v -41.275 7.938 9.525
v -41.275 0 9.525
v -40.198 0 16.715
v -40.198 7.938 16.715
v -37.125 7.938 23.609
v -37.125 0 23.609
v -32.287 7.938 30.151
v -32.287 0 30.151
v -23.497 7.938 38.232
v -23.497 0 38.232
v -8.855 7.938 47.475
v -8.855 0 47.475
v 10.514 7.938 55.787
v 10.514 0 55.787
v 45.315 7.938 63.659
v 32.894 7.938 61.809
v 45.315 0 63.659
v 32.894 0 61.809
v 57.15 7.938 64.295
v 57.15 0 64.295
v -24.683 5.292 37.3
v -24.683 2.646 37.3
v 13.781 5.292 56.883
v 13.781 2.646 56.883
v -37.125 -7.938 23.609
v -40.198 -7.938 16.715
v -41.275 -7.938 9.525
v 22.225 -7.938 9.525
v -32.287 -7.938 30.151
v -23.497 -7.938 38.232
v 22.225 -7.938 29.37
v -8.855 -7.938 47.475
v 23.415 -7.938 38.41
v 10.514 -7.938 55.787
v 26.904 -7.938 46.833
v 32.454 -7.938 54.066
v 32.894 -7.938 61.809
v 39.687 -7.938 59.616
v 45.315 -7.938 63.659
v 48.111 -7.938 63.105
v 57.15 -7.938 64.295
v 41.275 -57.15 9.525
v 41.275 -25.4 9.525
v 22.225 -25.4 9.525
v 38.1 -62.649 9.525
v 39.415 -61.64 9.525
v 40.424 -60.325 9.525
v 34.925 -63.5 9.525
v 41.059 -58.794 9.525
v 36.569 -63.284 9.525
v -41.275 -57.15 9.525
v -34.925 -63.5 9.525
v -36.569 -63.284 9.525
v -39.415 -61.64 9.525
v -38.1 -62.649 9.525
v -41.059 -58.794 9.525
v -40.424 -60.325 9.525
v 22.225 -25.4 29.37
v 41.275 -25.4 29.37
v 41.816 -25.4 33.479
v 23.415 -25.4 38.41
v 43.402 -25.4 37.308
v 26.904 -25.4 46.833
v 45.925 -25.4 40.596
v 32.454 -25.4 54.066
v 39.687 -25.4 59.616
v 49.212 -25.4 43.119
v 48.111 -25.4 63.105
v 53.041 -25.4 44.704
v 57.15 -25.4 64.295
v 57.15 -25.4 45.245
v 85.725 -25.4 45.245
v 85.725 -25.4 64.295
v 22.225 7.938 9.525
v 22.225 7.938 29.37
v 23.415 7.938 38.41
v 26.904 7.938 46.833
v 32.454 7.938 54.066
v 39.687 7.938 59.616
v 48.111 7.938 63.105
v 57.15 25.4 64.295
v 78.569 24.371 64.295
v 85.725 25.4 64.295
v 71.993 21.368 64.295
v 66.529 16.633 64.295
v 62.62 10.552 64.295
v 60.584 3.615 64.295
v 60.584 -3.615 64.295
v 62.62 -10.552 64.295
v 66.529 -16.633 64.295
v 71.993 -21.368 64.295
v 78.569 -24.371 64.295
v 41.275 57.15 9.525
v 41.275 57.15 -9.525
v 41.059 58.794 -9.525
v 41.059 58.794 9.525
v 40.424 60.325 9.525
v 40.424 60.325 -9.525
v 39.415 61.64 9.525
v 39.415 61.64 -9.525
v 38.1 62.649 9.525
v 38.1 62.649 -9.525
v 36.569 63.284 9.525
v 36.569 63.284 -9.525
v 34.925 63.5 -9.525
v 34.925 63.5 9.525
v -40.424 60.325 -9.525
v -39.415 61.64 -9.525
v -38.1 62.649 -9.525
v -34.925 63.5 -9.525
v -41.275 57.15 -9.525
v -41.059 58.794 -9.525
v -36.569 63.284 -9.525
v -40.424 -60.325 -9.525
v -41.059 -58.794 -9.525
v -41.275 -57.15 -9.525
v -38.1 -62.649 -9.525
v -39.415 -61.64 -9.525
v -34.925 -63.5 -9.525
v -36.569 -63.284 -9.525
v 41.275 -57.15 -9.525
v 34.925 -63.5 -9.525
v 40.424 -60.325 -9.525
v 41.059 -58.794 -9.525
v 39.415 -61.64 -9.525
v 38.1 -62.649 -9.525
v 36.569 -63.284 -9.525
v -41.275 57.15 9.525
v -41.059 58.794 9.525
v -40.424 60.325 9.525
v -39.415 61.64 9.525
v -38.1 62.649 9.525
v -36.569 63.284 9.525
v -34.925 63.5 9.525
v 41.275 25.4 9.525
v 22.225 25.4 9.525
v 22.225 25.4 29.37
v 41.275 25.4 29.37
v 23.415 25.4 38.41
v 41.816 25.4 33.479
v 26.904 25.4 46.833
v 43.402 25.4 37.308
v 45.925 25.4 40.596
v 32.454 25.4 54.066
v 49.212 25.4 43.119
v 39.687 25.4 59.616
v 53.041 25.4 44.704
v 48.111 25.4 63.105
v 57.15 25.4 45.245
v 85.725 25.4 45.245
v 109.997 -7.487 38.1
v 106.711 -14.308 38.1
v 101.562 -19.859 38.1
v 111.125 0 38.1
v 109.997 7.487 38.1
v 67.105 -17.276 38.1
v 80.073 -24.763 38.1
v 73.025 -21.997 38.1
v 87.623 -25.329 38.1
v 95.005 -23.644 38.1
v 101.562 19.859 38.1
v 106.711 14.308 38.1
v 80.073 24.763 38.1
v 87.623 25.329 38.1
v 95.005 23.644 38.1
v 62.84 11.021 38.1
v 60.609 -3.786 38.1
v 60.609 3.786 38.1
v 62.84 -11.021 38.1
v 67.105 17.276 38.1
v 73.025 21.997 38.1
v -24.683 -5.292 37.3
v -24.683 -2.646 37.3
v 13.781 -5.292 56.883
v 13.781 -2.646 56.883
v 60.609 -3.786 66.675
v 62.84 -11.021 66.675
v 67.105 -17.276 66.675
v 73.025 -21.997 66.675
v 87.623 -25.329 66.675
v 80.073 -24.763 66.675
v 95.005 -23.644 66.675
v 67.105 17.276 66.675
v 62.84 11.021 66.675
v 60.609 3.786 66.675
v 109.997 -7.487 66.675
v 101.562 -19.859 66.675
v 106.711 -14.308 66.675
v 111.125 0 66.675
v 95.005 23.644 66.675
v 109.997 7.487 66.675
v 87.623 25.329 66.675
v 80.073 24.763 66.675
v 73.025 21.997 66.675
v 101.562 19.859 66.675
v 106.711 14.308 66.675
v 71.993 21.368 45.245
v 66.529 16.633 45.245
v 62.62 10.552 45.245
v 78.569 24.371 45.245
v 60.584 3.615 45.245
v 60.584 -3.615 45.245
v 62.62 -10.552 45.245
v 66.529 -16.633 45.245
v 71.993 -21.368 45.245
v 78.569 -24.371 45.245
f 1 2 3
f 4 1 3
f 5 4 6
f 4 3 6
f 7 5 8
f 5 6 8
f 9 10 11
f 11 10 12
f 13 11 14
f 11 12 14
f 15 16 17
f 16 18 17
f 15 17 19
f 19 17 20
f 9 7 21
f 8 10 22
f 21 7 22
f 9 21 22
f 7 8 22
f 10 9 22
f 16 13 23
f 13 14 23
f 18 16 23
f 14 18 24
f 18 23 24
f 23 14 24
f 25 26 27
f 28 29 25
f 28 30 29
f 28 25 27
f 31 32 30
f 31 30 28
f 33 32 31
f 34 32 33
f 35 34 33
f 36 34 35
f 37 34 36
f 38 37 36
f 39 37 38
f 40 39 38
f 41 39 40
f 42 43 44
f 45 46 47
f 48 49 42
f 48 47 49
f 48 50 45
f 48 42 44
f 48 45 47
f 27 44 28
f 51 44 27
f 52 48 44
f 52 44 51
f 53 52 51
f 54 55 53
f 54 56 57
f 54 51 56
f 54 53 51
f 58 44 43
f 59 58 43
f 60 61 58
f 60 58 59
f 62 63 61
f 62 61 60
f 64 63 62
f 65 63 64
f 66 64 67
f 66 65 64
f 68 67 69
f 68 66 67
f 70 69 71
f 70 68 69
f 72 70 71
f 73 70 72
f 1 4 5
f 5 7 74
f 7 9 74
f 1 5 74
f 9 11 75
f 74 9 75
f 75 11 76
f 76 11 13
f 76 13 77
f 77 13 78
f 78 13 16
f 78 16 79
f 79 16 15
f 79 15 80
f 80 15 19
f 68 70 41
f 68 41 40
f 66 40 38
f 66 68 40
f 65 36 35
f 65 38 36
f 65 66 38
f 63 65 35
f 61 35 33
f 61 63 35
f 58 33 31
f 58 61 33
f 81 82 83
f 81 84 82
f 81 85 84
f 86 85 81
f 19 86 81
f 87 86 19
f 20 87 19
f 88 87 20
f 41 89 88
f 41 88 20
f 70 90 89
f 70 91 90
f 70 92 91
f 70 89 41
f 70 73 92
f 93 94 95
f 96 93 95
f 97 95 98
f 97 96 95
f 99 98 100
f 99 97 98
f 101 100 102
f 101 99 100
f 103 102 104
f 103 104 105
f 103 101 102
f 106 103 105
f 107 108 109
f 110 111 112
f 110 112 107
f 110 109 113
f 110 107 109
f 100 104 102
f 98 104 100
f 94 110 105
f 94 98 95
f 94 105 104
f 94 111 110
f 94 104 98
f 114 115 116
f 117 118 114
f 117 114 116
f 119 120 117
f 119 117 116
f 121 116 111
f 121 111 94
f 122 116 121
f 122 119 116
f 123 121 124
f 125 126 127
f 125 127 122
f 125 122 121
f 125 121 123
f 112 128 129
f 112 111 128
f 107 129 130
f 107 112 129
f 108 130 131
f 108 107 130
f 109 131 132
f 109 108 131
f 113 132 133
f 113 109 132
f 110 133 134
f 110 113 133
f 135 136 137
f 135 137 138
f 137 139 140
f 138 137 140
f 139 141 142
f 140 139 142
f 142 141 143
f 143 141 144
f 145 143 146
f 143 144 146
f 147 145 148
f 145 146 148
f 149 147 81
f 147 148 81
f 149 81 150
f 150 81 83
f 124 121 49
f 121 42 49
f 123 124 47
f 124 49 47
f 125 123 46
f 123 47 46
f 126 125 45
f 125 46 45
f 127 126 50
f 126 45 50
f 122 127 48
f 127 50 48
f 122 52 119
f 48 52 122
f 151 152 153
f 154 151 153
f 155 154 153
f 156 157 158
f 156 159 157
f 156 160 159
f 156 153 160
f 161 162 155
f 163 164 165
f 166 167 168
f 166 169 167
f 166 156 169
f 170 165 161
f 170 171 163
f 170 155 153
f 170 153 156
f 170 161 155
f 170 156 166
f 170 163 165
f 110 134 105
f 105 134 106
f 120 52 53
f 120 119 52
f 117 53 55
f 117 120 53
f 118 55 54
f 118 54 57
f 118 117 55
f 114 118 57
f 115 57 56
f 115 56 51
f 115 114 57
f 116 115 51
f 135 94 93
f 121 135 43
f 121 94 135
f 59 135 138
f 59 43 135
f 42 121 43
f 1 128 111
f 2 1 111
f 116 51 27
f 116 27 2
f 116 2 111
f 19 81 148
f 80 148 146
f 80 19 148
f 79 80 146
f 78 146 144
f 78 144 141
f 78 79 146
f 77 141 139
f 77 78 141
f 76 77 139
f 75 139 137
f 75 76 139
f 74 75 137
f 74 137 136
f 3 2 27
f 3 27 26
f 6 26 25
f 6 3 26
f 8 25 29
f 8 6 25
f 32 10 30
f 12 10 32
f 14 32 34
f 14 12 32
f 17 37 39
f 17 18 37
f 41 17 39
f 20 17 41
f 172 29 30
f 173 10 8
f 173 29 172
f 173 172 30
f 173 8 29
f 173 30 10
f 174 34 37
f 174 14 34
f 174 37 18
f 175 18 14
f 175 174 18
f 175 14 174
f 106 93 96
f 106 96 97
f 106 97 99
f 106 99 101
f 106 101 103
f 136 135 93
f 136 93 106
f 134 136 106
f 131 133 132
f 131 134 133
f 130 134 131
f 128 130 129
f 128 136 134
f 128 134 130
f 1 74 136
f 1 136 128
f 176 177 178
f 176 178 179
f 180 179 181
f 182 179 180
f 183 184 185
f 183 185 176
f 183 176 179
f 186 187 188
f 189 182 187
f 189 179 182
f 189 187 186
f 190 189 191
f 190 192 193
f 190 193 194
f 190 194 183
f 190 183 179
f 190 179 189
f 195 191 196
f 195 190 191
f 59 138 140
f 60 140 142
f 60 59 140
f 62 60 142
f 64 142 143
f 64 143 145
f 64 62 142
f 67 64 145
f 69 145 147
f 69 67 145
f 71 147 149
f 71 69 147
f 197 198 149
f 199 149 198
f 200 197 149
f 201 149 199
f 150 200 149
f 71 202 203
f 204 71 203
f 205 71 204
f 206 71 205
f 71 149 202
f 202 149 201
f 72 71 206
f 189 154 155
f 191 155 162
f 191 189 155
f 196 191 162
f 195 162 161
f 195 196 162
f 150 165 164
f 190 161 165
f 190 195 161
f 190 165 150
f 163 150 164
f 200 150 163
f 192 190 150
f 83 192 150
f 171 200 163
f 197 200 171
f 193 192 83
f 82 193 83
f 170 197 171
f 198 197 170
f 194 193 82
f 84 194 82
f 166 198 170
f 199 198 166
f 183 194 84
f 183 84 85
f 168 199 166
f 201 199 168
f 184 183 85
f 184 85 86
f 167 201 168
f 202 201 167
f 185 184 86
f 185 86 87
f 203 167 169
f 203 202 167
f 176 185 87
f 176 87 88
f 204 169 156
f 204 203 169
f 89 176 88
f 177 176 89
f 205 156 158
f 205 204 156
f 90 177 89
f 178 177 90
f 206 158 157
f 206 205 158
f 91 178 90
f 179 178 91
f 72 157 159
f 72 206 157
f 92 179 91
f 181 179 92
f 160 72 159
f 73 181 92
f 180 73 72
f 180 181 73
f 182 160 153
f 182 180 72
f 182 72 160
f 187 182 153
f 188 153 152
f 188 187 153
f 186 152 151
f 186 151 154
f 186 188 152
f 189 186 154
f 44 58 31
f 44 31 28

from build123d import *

# Parameters (mm, degrees)
F1_DEPTH = 63.5
F0_W     = 25.4
F0_H     = 19.05
F2_DEPTH = 25.4
F3_DEPTH = 7.9375
F5_R     = 6.35


with BuildPart() as f1:
    # F0 (on Front) → F1 (new body, symmetric)
    with BuildSketch(Plane.XZ):
        Polygon((22.225, 9.525), (-41.275, 9.525), (-41.275, -9.525), (41.275, -9.525), (41.275, 9.525), align=None)
    extrude(amount=F1_DEPTH, both=True)

    # F0 (on Front) → F2 (join, symmetric)
    with BuildSketch(Plane.XZ):
        with BuildLine():
            Line((57.15, 45.2454016253), (60.325, 45.2454016253))
            Line((60.325, 45.2454016253), (60.325, 64.2954016253))
            Line((60.325, 64.2954016253), (57.15, 64.2954016253))
            ThreePointArc((57.15, 64.2954016253), (32.4542956671, 54.0661059583), (22.225, 29.3704016253))
            Line((22.225, 29.3704016253), (22.225, 9.525))
            Line((22.225, 9.525), (41.275, 9.525))
            Line((41.275, 9.525), (41.275, 29.3704016253))
            ThreePointArc((41.275, 29.3704016253), (45.9246798487, 40.5957217767), (57.15, 45.2454016253))
        make_face()
        with Locations((73.025, 54.7704016253)):
            Rectangle(F0_W, F0_H)
    extrude(amount=F2_DEPTH, both=True)

    # F0 (on Front) → F3 (join, symmetric)
    with BuildSketch(Plane.XZ):
        with BuildLine():
            ThreePointArc((22.225, 29.3704016253), (32.4542956671, 54.0661059583), (57.15, 64.2954016253))
            add(Edge.make_bspline(
                [(-41.275, 9.525), (-41.275, 40.0696797542), (16.9853791595, 64.2954016253), (57.15, 64.2954016253)],
                knots=[0, 0, 0, 0, 112.6378156713, 112.6378156713, 112.6378156713, 112.6378156713], degree=3))
            Line((-41.275, 9.525), (22.225, 9.525))
            Line((22.225, 9.525), (22.225, 29.3704016253))
        make_face()
    extrude(amount=F3_DEPTH, both=True)

    # F0 (on Front) → F4 (revolve)
    with BuildSketch(Plane.XZ):
        Polygon((85.725, 45.2454016253), (85.725, 38.1), (111.125, 38.1), (111.125, 66.675), (85.725, 66.675), (85.725, 64.2954016253), align=None)
    revolve(axis=Axis((85.725, 0, 52.3875), (0, 0, 1)))

    # F5
    f5_edges = [f1.edges().sort_by_distance(p)[0] for p in [
        (-41.275, -63.5, 0),
        (41.275, -63.5, 0),
        (41.275, 63.5, 0),
        (-41.275, 63.5, 0),
    ]]
    fillet(f5_edges, radius=F5_R)


solid = f1.part
